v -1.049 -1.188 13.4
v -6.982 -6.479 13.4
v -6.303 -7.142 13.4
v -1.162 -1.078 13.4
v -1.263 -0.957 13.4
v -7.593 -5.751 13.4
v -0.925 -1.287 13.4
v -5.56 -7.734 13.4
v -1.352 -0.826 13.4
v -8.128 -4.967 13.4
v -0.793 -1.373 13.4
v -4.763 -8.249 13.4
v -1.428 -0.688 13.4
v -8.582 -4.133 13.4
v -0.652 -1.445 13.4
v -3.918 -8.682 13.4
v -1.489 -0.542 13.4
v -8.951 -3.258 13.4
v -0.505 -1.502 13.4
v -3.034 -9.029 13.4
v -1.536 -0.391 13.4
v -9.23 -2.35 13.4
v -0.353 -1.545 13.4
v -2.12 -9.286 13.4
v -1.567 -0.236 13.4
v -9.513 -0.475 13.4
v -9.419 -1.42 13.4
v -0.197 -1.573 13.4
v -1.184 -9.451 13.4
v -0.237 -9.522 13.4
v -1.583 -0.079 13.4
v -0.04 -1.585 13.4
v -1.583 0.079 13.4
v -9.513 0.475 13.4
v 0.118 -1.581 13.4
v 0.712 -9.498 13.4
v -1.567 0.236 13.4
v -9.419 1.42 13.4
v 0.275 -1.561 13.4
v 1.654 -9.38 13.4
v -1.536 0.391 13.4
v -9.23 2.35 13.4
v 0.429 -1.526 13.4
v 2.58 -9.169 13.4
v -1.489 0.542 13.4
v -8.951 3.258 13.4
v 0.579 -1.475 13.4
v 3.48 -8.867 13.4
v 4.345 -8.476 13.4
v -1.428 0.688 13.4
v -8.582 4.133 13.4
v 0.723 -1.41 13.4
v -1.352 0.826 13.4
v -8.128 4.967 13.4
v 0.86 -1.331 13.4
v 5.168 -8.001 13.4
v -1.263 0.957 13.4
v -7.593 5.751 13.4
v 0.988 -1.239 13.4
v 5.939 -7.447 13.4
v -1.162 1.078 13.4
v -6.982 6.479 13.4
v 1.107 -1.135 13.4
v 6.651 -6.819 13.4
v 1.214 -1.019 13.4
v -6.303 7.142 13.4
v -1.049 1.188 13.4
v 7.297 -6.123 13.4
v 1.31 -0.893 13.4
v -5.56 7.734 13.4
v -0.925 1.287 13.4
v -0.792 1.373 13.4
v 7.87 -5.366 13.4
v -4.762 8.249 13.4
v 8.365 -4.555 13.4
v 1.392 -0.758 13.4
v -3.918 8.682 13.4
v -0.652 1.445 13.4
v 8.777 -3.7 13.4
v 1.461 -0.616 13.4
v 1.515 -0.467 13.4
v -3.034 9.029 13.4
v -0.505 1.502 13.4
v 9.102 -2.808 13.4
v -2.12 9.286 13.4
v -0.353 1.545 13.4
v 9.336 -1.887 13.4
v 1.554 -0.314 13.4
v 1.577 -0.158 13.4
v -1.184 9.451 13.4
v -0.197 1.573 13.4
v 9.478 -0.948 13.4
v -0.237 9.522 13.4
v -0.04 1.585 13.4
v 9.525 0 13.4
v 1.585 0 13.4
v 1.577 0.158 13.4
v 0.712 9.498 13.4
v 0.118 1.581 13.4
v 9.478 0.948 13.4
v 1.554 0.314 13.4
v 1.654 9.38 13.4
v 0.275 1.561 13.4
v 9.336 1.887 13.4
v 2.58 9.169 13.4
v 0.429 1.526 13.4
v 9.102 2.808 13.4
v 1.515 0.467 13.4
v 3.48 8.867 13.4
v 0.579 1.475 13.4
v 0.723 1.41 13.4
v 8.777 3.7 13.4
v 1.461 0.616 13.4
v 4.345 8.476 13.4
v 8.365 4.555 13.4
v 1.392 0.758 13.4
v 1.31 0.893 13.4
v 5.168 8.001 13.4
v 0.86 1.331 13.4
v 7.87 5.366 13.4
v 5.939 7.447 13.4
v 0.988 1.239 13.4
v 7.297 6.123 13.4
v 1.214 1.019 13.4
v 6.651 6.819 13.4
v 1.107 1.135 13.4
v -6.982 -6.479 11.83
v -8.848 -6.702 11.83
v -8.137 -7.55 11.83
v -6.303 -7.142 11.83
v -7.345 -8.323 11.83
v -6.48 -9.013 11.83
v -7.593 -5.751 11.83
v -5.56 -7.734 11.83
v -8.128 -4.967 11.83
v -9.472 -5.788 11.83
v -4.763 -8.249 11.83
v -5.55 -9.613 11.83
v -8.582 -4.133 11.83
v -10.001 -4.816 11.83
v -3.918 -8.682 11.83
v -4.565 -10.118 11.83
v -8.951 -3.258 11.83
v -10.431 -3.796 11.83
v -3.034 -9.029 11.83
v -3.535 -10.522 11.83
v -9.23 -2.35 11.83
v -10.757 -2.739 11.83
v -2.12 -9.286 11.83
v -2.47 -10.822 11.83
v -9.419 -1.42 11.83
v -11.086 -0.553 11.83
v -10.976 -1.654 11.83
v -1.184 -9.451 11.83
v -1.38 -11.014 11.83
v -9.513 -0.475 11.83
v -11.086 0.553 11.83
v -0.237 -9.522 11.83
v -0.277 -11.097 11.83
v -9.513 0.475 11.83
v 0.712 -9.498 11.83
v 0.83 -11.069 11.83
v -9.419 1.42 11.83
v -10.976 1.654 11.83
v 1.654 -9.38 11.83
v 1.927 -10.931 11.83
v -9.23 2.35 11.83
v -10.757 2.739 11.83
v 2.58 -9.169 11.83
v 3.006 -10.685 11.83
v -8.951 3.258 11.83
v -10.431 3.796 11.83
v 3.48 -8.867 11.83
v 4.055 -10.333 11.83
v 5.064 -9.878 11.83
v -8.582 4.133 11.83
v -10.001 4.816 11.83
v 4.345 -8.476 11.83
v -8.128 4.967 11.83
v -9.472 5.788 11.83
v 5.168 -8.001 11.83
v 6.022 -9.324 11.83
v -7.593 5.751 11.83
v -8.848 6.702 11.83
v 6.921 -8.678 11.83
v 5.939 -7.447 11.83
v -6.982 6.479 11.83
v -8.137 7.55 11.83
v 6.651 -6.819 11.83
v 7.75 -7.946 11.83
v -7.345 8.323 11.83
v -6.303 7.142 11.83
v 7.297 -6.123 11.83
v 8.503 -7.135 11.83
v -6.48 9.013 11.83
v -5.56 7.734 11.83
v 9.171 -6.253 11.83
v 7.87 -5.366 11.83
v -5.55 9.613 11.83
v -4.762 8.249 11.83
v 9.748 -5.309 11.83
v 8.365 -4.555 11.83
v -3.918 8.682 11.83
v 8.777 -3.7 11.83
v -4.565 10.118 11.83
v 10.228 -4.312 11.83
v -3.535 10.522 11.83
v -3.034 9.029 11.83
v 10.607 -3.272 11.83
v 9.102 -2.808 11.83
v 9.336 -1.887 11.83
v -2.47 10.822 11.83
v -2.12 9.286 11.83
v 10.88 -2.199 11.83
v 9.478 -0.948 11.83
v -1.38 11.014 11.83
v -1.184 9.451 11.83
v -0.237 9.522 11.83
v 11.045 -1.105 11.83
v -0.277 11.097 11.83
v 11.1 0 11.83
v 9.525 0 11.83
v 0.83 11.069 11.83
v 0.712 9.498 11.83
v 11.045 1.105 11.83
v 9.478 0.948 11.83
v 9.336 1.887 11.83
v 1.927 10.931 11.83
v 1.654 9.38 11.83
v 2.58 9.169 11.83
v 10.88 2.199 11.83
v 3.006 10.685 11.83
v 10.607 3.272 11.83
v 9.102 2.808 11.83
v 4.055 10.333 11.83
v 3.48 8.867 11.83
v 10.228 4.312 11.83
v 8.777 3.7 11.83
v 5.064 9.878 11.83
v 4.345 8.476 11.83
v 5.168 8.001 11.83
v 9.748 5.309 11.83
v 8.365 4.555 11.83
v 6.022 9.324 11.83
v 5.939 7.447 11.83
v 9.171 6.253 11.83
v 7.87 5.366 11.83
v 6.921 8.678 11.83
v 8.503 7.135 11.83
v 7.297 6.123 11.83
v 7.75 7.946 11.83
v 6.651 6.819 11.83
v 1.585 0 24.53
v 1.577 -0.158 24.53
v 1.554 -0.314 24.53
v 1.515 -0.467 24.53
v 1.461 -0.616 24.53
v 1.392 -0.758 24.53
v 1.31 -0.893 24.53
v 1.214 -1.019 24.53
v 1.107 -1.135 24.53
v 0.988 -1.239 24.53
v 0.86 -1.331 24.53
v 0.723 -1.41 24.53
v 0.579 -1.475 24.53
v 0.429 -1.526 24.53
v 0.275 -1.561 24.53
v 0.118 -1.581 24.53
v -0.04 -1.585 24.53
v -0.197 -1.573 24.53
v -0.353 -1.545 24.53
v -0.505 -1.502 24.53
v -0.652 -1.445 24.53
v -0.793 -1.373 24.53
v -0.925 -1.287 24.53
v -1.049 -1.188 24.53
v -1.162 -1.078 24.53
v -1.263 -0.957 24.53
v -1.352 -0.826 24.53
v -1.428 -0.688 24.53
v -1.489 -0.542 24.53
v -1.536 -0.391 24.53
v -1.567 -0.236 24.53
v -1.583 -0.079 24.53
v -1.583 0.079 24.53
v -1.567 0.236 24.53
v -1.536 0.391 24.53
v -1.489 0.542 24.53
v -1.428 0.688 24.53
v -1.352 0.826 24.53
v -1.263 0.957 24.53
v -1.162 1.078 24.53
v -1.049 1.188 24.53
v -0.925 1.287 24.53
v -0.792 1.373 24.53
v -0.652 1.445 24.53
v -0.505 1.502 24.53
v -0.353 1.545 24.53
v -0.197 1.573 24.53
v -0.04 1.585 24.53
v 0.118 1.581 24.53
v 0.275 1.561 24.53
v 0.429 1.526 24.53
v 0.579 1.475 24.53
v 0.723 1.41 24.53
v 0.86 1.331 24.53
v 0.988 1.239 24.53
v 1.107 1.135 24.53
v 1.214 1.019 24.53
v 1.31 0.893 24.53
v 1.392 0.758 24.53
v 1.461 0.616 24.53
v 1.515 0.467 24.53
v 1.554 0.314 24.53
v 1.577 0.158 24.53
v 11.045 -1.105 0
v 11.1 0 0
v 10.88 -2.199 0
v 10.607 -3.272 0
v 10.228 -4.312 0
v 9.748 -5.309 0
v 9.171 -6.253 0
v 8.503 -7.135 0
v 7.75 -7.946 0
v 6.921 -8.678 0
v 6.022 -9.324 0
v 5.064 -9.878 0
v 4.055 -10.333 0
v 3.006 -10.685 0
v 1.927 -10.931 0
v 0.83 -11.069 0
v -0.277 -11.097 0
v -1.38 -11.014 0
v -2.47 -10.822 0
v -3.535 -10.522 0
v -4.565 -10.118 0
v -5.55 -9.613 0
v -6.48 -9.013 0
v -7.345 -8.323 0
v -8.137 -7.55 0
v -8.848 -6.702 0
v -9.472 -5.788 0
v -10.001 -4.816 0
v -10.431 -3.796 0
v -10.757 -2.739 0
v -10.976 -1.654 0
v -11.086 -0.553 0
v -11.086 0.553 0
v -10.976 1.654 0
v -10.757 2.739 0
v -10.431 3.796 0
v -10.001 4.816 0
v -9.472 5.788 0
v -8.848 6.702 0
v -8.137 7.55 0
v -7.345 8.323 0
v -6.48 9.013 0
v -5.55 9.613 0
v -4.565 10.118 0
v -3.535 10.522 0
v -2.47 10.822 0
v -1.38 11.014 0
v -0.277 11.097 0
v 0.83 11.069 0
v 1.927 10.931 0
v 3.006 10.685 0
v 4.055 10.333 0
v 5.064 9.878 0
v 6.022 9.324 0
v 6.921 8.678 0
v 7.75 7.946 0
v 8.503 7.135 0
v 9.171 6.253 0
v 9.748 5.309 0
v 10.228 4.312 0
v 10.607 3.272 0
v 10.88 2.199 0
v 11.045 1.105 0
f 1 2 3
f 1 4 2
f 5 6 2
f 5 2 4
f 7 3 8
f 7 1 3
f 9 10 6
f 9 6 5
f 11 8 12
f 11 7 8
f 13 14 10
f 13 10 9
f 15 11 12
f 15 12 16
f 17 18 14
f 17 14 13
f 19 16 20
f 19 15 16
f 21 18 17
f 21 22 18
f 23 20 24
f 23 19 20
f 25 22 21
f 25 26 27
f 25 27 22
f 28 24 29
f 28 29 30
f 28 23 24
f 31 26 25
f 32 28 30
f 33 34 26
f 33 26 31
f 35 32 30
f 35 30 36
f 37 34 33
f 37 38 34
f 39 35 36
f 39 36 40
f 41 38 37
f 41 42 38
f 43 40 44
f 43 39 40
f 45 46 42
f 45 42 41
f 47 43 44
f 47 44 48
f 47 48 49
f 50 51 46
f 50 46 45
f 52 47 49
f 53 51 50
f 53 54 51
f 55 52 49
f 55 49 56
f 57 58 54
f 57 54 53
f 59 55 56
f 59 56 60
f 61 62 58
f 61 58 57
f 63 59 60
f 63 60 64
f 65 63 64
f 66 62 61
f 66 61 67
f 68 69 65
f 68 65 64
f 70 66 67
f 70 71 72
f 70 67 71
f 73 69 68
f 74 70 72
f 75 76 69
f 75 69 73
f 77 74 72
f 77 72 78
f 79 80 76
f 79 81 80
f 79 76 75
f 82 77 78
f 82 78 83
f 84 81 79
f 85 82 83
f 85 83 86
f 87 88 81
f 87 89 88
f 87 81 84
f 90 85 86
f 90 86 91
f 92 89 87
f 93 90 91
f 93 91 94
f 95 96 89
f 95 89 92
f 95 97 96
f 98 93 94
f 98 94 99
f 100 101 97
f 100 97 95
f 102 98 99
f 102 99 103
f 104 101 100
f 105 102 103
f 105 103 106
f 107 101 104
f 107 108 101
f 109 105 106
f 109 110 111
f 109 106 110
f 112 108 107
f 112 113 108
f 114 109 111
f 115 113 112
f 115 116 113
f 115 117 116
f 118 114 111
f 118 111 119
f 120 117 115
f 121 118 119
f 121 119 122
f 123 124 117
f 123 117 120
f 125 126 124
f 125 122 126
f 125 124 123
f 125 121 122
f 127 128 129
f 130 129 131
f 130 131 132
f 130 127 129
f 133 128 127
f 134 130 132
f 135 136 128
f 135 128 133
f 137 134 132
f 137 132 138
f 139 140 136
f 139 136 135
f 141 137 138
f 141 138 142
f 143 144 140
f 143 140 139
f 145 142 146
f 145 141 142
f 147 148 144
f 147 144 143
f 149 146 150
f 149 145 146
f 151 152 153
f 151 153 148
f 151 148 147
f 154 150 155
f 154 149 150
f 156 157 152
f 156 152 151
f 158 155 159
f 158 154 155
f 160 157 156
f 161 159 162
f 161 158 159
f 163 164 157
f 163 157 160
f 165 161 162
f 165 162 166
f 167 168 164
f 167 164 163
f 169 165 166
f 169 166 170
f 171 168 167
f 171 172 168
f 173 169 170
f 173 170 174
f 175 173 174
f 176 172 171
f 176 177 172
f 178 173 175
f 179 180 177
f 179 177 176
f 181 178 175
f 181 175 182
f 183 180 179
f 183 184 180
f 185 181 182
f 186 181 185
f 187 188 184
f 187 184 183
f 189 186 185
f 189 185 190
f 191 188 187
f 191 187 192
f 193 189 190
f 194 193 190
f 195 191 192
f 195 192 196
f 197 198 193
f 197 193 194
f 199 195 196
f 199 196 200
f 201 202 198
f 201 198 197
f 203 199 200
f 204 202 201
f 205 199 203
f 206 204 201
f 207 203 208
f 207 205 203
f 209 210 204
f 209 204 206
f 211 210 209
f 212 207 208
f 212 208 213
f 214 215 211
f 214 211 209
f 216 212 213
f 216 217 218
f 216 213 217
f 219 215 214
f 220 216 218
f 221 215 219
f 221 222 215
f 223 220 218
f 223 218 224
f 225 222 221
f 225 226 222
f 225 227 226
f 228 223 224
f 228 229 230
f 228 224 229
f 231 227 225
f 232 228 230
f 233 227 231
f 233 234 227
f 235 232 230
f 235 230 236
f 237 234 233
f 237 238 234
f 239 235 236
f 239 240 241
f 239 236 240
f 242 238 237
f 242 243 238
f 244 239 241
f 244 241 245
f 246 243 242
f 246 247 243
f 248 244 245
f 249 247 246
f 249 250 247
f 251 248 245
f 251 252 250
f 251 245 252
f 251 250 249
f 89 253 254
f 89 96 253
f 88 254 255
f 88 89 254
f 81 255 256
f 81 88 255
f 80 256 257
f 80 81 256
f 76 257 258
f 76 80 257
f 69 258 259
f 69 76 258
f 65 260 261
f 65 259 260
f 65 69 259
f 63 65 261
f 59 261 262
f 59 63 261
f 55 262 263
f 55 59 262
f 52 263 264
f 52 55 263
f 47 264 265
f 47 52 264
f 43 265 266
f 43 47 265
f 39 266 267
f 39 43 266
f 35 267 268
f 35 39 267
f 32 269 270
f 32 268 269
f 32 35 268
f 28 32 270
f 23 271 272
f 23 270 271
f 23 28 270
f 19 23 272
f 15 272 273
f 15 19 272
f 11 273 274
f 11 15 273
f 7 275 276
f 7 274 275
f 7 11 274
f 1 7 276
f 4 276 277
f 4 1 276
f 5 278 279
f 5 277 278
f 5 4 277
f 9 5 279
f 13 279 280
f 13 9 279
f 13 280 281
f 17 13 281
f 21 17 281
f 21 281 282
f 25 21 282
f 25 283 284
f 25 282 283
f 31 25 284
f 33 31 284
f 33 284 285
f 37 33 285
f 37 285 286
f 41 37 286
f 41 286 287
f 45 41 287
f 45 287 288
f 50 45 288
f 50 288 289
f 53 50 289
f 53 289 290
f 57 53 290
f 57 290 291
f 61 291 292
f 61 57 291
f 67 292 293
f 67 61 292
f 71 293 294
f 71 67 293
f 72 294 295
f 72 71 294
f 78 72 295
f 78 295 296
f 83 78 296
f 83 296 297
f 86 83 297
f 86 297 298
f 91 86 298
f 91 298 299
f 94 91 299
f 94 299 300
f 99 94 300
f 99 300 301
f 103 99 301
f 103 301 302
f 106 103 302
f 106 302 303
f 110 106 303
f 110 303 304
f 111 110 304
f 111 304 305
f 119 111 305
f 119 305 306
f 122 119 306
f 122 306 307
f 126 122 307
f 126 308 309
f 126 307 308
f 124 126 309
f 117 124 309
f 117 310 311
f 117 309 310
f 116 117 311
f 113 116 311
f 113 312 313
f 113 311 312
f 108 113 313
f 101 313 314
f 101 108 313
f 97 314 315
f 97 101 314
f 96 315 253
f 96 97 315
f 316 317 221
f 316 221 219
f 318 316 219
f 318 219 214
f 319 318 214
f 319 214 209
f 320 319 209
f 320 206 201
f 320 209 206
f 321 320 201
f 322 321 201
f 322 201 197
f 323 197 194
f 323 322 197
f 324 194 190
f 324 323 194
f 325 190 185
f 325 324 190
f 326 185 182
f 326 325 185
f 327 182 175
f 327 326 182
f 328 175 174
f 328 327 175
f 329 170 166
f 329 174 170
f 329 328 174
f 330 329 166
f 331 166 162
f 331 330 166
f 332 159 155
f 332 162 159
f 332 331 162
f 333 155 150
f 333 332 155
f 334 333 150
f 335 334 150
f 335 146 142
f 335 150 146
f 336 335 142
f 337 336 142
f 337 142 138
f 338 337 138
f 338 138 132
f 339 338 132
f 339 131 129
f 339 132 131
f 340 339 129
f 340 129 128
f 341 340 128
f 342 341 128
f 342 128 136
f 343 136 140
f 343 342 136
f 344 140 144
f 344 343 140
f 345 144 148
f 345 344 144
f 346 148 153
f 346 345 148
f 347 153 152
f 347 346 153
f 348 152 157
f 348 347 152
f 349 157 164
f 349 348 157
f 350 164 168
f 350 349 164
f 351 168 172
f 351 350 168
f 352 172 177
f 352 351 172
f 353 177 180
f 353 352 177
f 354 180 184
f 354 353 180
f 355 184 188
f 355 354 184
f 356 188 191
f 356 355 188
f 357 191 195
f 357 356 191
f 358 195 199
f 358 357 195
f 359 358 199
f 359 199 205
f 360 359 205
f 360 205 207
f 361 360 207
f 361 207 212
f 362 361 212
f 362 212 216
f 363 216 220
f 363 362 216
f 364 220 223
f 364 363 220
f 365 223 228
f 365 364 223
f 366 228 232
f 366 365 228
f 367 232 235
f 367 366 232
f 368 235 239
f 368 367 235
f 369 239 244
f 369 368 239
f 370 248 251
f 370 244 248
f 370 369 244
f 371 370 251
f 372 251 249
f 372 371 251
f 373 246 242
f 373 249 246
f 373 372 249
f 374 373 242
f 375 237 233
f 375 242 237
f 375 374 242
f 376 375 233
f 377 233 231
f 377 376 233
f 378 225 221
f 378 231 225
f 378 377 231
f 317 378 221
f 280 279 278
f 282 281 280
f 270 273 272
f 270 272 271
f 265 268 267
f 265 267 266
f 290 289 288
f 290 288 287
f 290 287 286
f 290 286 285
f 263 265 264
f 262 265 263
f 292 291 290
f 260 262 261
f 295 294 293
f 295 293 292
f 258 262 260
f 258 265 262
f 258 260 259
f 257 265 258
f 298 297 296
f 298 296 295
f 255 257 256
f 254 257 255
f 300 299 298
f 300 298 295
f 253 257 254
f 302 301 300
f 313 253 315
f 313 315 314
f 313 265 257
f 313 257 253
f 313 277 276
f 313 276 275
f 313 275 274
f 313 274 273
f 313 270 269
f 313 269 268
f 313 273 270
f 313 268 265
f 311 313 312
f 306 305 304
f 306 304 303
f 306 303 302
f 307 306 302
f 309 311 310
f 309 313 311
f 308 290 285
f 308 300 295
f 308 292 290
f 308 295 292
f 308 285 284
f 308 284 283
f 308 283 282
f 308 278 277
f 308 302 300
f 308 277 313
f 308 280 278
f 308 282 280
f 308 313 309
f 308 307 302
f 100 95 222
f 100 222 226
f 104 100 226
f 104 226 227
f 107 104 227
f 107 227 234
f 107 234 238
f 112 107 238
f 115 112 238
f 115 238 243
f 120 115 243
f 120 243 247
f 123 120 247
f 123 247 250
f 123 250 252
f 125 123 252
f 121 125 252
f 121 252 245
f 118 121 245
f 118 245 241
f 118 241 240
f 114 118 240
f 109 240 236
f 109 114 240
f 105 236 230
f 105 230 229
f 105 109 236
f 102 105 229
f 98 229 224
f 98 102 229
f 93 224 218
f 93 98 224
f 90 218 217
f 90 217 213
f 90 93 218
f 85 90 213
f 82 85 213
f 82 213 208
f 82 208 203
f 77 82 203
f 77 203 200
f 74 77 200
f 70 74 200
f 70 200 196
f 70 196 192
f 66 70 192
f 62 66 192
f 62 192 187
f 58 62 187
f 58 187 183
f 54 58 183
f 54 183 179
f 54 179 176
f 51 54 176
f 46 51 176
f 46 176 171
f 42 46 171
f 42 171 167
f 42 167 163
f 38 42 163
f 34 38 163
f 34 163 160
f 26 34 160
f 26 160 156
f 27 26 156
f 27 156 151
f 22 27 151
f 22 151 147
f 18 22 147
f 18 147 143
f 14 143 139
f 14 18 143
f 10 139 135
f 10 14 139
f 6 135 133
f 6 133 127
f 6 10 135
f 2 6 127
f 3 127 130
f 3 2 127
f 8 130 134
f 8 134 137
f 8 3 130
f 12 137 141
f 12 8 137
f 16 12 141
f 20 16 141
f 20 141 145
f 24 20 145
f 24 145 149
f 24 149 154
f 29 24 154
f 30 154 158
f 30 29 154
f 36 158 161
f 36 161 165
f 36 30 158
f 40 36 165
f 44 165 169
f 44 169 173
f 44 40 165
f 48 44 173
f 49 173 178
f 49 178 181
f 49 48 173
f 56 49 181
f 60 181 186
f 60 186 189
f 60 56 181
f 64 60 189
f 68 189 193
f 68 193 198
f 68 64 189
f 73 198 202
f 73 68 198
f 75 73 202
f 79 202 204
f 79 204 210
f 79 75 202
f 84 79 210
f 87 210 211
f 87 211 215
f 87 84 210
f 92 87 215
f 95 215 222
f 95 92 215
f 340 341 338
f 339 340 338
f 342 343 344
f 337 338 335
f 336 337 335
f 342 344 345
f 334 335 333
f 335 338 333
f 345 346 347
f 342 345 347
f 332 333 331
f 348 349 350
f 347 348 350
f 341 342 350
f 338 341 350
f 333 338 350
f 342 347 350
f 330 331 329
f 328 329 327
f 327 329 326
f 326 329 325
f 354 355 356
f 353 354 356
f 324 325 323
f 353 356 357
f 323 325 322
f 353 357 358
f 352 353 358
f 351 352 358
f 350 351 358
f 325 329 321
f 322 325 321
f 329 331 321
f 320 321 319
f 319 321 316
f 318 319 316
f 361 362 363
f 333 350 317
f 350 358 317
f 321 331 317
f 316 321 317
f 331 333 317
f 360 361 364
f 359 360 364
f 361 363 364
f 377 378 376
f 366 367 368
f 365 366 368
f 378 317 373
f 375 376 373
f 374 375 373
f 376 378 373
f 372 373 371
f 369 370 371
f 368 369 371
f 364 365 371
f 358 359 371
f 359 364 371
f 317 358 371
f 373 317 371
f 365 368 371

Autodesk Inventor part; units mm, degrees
ref_plane "YZ Plane" through (0, 0, 0) normal (1, 0, 0) x (0, 1, 0)
ref_plane "XZ Plane" through (0, 0, 0) normal (0, 1, 0) x (-1, 0, 0)
ref_plane "XY Plane" through (0, 0, 0) normal (0, 0, 1) x (1, 0, 0)
sketch "Esquisse1" plane through (0, 0, 0) normal (0, 0, 1) x (1, 0, 0)
  circle A0 centre (0, 0) radius 11.1
  dimension "d0" = 22.2
extrude "Extrusion1" add sketch "Esquisse1" along normal blind 13.4
sketch "Esquisse2" plane through (0, 0, 13.4) normal (0, 0, 1) x (1, 0, 0)
  circle A0 centre (0, 0) radius 11.1 projected
  circle A1 centre (0, 0) radius 9.525
  dimension "d3" = 19.05
extrude "Extrusion2" cut sketch "Esquisse2" against normal blind 1.57
sketch "Esquisse4" plane through (0, 0, 13.4) normal (0, 0, 1) x (1, 0, 0)
  circle A0 centre (0, 0) radius 9.525 projected
  circle A1 centre (0, 0) radius 1.585
  dimension "d7" = 3.17
extrude "Extrusion3" add sketch "Esquisse4" along normal blind 11.13 contours A1
properties part number "Vishay-157" material "Aluminium 6061"
